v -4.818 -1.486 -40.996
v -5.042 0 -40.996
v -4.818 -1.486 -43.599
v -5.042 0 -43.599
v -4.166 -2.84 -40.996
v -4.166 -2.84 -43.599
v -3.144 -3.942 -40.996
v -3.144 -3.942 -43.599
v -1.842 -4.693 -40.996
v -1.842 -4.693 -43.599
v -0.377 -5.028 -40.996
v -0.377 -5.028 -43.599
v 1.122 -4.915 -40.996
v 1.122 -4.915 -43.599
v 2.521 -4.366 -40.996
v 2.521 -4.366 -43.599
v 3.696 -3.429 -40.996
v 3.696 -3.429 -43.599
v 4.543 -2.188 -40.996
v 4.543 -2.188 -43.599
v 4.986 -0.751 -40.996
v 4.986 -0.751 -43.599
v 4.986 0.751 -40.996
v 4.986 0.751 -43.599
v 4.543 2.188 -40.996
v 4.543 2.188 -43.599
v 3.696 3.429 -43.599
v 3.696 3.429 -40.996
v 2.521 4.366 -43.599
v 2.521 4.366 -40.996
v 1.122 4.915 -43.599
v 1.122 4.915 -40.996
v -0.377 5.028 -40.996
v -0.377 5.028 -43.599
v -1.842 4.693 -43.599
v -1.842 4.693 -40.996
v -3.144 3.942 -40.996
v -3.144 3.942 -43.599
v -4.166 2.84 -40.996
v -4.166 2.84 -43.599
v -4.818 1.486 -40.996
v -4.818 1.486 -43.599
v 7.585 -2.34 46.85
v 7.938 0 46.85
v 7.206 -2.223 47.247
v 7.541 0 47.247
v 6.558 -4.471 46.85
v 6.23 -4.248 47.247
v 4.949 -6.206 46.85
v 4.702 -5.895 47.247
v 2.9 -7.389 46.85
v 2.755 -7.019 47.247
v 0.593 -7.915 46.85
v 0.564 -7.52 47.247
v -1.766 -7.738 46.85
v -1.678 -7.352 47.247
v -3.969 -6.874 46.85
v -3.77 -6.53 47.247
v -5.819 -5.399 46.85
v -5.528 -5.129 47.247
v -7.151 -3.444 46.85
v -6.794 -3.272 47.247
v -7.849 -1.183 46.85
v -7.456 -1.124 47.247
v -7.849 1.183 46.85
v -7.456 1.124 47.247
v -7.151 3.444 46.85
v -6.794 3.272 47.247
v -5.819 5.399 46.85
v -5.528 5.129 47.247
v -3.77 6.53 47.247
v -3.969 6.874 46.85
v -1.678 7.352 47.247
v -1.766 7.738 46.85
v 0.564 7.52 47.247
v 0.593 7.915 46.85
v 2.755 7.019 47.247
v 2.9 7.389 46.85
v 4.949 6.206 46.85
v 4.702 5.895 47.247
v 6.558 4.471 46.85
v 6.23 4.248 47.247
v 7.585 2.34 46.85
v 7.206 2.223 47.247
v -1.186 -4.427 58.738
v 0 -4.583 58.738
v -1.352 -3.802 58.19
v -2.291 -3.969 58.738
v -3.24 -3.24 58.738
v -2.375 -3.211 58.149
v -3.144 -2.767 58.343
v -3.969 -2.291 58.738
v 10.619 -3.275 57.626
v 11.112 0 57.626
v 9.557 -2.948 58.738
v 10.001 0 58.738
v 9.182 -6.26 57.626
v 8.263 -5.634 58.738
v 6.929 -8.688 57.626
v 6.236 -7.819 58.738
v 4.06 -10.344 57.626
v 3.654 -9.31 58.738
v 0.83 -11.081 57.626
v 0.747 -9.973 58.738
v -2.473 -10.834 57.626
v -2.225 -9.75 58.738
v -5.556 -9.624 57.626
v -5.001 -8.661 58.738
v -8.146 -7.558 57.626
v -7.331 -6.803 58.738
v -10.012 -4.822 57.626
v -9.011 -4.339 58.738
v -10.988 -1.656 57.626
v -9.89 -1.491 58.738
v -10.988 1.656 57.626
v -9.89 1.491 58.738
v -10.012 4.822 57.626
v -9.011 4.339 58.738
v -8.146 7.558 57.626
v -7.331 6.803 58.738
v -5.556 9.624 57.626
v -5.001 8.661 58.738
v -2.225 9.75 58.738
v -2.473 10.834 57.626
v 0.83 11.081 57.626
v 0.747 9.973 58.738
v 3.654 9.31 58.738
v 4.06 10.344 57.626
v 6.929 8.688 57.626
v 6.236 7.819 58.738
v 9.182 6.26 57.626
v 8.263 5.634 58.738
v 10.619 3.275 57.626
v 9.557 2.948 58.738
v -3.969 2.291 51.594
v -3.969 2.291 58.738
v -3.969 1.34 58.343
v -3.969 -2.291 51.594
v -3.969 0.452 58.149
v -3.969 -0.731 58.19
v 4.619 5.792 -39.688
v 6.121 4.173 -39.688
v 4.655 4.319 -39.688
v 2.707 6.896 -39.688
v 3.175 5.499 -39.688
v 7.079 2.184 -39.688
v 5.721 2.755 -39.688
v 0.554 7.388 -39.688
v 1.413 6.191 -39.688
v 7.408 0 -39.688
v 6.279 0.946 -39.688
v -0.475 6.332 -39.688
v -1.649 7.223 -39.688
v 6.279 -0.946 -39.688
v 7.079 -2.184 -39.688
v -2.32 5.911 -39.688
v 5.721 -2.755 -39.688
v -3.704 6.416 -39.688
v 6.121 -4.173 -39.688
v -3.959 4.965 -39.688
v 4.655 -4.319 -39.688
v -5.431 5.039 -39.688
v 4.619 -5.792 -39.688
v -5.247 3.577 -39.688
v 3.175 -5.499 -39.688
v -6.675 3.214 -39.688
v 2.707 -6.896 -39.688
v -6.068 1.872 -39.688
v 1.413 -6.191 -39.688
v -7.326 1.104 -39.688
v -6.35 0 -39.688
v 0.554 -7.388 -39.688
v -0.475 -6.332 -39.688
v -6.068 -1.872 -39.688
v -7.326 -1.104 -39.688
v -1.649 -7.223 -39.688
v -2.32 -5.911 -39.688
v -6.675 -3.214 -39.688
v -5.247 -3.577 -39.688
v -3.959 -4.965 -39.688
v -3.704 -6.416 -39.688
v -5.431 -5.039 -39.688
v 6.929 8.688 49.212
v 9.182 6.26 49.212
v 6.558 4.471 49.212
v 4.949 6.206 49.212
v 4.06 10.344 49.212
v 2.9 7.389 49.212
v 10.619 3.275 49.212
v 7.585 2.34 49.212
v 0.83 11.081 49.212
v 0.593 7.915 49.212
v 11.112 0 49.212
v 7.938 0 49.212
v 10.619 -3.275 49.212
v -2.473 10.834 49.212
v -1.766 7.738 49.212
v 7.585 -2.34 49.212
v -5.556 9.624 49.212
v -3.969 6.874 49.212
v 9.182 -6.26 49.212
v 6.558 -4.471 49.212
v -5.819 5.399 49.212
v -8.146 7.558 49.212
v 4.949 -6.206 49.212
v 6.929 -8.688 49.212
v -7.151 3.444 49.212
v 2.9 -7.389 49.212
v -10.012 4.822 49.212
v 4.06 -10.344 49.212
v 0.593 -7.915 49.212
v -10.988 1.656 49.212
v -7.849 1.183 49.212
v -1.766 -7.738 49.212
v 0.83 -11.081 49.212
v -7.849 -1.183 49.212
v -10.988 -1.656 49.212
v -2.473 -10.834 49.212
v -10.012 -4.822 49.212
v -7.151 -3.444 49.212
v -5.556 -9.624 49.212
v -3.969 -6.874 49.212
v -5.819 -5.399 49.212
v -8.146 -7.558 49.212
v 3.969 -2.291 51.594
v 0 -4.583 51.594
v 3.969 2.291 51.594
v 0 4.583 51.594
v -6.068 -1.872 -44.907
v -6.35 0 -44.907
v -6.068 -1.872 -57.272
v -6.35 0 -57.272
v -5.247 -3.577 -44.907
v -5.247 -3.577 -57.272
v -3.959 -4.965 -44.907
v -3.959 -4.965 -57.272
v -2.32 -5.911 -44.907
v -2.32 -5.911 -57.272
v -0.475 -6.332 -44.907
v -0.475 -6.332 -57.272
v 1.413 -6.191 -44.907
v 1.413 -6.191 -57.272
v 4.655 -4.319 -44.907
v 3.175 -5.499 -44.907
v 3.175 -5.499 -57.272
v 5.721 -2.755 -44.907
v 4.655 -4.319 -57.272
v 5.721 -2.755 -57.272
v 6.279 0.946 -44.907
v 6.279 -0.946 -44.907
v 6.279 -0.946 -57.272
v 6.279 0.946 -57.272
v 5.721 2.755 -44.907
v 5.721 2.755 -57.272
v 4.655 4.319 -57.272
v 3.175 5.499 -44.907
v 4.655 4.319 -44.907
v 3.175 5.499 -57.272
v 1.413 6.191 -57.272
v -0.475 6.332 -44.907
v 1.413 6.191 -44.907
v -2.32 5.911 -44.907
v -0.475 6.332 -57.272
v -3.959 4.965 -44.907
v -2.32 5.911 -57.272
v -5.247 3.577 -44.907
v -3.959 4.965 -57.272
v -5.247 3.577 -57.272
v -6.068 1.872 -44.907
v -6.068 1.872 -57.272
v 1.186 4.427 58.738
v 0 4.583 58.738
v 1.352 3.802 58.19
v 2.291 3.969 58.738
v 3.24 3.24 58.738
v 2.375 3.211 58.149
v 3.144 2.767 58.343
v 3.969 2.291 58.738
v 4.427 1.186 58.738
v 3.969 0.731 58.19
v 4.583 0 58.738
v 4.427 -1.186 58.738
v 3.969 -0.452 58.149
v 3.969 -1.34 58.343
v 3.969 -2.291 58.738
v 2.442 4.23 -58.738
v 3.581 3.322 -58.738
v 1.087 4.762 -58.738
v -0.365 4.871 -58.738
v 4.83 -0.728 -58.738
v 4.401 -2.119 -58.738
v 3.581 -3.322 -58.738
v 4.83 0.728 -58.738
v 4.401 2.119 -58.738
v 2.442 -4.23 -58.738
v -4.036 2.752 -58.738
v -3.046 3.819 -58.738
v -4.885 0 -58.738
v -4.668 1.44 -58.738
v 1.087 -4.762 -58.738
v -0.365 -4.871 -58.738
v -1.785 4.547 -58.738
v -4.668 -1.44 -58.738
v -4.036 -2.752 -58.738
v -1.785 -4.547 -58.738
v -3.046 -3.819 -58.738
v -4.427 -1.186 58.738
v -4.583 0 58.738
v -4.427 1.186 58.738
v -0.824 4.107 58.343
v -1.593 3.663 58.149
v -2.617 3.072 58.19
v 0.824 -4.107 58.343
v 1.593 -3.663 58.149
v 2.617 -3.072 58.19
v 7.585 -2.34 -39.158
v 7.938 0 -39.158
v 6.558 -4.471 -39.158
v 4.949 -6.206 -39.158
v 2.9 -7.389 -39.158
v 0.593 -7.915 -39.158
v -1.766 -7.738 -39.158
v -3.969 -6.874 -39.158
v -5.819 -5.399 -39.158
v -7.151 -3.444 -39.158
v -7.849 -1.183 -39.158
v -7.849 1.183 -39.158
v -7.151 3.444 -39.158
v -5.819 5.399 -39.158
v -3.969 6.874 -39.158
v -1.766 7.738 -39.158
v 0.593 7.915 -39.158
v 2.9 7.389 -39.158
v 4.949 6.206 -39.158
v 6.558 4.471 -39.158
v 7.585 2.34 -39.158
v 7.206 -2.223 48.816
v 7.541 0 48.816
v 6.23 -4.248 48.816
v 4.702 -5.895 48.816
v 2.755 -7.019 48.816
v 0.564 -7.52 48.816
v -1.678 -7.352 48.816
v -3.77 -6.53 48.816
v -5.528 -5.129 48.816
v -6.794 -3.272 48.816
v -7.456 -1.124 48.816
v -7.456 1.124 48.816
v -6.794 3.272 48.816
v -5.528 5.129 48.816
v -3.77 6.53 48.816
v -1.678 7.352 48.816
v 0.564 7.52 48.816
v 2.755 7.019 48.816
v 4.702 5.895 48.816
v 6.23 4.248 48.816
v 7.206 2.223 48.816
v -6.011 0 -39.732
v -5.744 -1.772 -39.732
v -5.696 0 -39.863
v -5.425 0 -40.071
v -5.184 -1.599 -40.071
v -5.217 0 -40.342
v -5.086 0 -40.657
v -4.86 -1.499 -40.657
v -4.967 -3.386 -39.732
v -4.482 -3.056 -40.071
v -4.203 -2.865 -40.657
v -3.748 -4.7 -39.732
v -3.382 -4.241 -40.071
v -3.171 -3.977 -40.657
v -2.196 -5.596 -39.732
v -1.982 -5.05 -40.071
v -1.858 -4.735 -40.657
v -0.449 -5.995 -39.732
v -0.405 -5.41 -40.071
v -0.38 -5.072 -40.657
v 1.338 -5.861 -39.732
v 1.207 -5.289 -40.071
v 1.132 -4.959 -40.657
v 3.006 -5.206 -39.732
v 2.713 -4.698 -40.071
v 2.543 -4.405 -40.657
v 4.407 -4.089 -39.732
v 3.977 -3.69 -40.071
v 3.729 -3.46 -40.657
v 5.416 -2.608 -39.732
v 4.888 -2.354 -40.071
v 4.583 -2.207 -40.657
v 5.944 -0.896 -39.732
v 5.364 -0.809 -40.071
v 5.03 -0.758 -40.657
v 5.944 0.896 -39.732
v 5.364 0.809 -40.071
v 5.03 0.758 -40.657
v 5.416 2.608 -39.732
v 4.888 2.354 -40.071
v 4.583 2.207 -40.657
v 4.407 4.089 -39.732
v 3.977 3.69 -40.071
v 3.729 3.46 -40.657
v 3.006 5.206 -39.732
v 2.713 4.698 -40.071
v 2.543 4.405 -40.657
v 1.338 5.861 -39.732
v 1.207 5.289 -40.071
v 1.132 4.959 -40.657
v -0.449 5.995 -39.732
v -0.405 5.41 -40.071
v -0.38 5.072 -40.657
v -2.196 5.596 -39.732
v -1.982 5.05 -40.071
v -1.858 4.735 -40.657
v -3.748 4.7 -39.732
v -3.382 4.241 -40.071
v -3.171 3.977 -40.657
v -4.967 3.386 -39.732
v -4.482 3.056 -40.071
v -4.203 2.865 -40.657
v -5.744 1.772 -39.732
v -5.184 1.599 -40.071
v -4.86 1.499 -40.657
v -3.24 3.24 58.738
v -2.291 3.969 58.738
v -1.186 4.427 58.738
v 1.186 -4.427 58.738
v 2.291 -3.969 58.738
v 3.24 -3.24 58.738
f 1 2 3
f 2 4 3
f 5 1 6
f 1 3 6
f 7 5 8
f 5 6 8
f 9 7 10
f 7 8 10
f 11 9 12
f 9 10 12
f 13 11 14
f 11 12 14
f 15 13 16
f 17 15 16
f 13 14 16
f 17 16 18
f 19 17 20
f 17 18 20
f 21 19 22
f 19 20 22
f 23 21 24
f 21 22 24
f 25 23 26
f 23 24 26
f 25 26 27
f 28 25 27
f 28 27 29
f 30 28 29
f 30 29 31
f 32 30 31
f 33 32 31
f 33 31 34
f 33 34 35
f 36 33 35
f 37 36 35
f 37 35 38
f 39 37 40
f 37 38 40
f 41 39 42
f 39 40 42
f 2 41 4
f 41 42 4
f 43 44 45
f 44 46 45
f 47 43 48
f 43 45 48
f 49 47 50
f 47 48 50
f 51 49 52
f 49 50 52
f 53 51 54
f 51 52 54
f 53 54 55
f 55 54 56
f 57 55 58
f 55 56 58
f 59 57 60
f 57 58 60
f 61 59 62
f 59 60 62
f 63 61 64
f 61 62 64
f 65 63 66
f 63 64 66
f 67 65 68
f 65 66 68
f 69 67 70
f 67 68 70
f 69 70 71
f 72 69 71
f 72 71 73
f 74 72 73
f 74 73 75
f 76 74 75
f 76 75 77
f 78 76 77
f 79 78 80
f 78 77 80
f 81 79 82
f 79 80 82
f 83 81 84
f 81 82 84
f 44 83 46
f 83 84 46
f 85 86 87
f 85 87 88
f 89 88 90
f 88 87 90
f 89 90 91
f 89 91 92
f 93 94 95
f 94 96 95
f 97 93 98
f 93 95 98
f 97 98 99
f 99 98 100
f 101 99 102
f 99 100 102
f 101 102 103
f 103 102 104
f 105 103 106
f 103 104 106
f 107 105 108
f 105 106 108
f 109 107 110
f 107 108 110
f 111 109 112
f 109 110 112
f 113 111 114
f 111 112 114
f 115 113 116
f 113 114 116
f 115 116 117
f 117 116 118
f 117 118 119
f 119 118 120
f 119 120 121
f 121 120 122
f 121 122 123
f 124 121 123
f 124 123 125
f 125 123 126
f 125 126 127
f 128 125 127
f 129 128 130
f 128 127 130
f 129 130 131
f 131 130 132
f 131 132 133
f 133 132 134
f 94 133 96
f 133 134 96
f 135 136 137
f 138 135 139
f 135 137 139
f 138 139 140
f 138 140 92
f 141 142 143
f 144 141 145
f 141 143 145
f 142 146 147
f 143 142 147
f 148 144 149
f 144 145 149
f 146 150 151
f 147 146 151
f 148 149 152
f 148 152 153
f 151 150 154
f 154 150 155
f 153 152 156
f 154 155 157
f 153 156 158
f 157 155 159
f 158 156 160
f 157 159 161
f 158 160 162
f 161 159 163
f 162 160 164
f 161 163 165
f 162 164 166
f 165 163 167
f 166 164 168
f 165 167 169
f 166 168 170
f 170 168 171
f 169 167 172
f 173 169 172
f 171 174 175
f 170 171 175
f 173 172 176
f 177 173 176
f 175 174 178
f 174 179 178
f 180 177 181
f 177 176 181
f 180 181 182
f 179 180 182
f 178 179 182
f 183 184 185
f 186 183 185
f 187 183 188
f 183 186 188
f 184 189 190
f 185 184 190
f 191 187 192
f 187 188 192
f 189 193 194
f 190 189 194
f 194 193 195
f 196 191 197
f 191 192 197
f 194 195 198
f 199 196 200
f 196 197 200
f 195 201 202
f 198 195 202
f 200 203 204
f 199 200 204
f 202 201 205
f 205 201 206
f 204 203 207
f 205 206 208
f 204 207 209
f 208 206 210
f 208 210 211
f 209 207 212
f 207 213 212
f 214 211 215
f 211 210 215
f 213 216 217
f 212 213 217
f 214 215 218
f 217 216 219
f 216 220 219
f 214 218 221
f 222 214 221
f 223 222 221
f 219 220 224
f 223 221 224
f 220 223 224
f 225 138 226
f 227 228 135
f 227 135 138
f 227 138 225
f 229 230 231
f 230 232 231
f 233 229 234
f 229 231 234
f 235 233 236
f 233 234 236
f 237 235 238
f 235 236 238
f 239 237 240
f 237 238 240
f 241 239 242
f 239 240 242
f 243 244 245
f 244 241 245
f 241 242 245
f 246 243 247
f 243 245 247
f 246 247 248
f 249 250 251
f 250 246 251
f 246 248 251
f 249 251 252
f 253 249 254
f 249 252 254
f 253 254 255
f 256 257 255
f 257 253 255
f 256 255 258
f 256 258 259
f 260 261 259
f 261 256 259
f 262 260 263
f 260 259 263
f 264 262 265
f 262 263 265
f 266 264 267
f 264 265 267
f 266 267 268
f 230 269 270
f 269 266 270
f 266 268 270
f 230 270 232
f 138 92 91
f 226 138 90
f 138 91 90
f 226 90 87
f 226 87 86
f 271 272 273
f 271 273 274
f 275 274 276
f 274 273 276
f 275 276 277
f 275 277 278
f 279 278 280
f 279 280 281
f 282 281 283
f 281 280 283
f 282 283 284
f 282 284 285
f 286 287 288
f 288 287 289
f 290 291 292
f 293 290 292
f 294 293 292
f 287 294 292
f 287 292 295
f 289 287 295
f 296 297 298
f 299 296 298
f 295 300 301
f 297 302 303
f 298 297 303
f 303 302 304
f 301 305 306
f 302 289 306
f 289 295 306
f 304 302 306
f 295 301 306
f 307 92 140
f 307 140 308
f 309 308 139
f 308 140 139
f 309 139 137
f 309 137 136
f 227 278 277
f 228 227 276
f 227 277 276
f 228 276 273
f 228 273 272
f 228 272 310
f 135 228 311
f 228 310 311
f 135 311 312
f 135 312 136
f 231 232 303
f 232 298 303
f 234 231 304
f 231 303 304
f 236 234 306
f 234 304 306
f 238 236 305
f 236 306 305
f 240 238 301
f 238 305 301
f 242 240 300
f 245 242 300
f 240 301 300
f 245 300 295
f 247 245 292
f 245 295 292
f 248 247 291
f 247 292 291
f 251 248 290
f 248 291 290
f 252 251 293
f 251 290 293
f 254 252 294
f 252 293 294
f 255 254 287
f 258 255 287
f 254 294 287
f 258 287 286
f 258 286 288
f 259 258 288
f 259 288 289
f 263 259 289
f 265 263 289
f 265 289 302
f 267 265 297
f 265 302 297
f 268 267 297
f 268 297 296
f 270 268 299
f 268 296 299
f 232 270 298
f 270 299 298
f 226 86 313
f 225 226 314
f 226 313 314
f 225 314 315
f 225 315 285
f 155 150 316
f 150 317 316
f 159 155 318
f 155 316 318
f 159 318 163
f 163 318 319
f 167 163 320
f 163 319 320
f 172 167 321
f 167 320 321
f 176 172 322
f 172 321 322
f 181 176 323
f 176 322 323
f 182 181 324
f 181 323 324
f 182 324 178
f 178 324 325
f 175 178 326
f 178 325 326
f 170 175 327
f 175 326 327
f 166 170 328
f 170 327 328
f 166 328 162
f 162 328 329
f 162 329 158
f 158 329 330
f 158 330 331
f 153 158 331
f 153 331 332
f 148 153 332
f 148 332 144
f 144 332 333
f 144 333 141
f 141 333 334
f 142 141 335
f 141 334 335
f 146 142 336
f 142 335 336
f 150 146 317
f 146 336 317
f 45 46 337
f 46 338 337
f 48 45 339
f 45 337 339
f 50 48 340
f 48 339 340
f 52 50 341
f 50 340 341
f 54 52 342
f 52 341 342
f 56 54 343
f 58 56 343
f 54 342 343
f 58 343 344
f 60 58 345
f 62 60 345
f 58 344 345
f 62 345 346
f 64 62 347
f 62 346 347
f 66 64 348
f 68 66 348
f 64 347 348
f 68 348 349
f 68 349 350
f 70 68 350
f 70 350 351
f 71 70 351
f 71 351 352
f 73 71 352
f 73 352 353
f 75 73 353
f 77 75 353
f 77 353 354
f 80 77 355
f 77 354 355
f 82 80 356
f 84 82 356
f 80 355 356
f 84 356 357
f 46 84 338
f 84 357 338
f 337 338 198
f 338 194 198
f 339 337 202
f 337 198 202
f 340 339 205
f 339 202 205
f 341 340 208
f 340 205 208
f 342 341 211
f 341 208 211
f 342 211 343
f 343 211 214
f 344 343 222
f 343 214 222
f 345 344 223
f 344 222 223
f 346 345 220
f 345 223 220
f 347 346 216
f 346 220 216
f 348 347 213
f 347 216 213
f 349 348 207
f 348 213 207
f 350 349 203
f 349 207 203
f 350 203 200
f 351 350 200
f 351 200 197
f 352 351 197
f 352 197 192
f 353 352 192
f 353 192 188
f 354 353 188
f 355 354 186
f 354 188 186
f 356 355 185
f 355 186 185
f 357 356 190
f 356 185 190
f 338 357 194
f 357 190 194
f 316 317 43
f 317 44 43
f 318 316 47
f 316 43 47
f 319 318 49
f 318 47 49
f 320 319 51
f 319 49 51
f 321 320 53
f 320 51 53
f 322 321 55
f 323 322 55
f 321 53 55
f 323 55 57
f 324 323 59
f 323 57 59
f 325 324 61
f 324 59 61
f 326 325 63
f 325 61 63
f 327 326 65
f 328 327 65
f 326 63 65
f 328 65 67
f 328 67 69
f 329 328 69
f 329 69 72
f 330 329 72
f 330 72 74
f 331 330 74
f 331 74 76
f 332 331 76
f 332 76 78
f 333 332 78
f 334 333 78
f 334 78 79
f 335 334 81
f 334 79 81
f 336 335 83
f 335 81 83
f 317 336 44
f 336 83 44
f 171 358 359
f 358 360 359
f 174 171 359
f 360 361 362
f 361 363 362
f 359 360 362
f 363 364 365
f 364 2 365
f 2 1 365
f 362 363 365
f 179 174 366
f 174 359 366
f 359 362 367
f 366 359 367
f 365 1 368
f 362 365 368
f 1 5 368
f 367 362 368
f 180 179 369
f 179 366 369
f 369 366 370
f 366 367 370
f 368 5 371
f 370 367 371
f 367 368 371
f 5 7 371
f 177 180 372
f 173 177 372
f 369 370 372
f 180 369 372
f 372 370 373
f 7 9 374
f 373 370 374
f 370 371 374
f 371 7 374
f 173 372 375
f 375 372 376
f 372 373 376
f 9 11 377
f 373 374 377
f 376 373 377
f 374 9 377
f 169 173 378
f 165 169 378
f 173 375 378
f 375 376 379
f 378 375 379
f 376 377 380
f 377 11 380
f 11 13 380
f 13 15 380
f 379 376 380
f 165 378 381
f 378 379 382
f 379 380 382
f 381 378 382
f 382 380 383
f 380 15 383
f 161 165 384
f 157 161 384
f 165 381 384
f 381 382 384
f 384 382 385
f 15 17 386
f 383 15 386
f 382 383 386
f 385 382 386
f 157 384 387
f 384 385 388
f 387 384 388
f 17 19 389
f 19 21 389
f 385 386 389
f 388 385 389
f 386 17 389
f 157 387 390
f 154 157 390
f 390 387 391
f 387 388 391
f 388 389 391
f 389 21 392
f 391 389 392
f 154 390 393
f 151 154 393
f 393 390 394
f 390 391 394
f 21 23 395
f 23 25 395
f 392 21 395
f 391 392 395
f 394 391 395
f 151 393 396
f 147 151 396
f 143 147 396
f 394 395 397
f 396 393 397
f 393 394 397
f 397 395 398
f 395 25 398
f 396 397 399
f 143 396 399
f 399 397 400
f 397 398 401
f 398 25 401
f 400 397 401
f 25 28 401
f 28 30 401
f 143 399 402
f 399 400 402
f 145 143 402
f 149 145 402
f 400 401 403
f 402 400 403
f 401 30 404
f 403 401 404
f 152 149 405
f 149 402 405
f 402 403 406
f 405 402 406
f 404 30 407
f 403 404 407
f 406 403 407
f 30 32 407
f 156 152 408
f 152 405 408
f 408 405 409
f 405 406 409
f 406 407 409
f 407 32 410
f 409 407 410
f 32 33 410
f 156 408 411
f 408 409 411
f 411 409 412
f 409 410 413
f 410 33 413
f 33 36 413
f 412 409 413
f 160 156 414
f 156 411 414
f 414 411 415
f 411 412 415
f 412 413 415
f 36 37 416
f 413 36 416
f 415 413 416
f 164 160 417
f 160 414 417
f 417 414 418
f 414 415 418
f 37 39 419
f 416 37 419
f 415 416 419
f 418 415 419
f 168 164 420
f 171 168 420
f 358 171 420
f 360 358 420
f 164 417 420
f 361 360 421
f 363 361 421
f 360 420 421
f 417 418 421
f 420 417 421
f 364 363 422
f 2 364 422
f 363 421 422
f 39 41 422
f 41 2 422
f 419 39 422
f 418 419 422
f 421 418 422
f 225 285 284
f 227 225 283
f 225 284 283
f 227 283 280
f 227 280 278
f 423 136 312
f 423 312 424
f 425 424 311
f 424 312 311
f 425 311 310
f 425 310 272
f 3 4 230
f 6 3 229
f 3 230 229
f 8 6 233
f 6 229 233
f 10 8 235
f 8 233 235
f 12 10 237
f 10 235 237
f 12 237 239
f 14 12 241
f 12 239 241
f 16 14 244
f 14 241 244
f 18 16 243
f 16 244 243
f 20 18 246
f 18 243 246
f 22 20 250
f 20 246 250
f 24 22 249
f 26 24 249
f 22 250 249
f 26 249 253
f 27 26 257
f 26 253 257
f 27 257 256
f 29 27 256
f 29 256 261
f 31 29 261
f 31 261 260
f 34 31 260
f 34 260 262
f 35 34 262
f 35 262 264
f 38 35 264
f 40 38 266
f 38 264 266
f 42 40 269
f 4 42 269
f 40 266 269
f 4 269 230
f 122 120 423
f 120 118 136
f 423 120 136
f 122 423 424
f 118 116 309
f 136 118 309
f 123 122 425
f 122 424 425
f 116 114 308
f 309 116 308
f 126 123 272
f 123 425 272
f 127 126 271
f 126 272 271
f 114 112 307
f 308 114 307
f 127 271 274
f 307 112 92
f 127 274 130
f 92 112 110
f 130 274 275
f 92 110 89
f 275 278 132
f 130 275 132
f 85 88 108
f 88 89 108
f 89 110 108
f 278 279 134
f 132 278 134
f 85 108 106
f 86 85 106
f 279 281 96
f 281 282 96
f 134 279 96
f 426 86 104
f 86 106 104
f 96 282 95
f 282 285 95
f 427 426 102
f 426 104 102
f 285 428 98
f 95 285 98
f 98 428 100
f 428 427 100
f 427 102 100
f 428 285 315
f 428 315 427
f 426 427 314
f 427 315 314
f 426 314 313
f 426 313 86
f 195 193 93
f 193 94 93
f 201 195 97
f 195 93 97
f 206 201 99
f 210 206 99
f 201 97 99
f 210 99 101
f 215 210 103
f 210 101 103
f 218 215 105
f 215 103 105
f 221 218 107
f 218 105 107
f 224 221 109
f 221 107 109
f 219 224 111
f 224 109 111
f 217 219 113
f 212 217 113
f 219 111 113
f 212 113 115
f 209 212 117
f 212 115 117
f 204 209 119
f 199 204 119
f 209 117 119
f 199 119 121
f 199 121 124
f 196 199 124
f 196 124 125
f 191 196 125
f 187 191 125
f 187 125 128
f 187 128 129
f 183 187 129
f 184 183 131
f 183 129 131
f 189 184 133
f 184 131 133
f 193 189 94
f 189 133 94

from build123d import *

# Parameters (mm, degrees)
CUT_EXTRUDE1_DEPTH = 7.14375


with BuildPart() as part:
    # Sketch4 → Revolve1 (revolve)
    with BuildSketch(Plane(origin=(0, 0, 0), x_dir=(0, 0, -1), z_dir=(1, 0, 0))):
        Polygon((-49.2125, 11.1125), (-57.62625, 11.1125), (-58.7375, 10.00125), (-58.7375, 0), (39.6875, 0), (39.6875, 7.408333333), (39.158333333, 7.9375), (-46.8503, 7.9375), (-47.247175, 7.540625), (-48.815625, 7.540625), (-49.2125, 7.9375), align=None)
    revolve(axis=Axis((0, 0, 58.7375), (0, 0, -1)))

    # Sketch5 → Cut-Extrude1 (cut)
    with BuildSketch(Plane.XY.offset(58.7375)):
        Polygon((3.96875, 2.291358881), (0, 4.582717762), (-3.96875, 2.291358881), (-3.96875, -2.291358881), (0, -4.582717762), (3.96875, -2.291358881), align=None)
    extrude(amount=-CUT_EXTRUDE1_DEPTH, mode=Mode.SUBTRACT)

    # Cut-Extrude4 cone 1 section (through the dimple's axis) → Cut-Extrude4 (revolve, cut)
    with BuildSketch(Plane(origin=(0, 0, 58.7375), x_dir=(0, -1, 0), z_dir=(1, 0, 0))):
        Polygon((0, 0), (4.582717762, 0), (0, 4.582717762), align=None)
    revolve(axis=Axis((0, 0, 58.7375), (0, 0, -1)), mode=Mode.SUBTRACT)

    # Sketch7 → Revolve2 (revolve)
    with BuildSketch(Plane(origin=(0, 0, 0), x_dir=(0, 0, -1), z_dir=(1, 0, 0))):
        Polygon((39.6875, 6.35), (57.272115385, 6.35), (58.7375, 4.884615385), (58.7375, 0), (39.6875, 0), align=None)
    revolve(axis=Axis((0, 0, -58.7375), (0, 0, 1)))

    # Sketch10 → Cut-Revolve1 (revolve, cut)
    with BuildSketch(Plane(origin=(0, 0, 0), x_dir=(0, 0, -1), z_dir=(1, 0, 0))):
        with BuildLine():
            Line((40.9956, 5.0419), (43.5991, 5.0419))
            Line((43.5991, 5.0419), (46.4947, 7.9375))
            Line((46.4947, 7.9375), (39.6875, 7.9375))
            Line((39.6875, 7.9375), (39.6875, 6.35))
            ThreePointArc((39.6875, 6.35), (40.07063362, 5.42503362), (40.9956, 5.0419))
        make_face()
    revolve(axis=Axis((0, 0, -58.7375), (0, 0, 1)), mode=Mode.SUBTRACT)


solid = part.part
